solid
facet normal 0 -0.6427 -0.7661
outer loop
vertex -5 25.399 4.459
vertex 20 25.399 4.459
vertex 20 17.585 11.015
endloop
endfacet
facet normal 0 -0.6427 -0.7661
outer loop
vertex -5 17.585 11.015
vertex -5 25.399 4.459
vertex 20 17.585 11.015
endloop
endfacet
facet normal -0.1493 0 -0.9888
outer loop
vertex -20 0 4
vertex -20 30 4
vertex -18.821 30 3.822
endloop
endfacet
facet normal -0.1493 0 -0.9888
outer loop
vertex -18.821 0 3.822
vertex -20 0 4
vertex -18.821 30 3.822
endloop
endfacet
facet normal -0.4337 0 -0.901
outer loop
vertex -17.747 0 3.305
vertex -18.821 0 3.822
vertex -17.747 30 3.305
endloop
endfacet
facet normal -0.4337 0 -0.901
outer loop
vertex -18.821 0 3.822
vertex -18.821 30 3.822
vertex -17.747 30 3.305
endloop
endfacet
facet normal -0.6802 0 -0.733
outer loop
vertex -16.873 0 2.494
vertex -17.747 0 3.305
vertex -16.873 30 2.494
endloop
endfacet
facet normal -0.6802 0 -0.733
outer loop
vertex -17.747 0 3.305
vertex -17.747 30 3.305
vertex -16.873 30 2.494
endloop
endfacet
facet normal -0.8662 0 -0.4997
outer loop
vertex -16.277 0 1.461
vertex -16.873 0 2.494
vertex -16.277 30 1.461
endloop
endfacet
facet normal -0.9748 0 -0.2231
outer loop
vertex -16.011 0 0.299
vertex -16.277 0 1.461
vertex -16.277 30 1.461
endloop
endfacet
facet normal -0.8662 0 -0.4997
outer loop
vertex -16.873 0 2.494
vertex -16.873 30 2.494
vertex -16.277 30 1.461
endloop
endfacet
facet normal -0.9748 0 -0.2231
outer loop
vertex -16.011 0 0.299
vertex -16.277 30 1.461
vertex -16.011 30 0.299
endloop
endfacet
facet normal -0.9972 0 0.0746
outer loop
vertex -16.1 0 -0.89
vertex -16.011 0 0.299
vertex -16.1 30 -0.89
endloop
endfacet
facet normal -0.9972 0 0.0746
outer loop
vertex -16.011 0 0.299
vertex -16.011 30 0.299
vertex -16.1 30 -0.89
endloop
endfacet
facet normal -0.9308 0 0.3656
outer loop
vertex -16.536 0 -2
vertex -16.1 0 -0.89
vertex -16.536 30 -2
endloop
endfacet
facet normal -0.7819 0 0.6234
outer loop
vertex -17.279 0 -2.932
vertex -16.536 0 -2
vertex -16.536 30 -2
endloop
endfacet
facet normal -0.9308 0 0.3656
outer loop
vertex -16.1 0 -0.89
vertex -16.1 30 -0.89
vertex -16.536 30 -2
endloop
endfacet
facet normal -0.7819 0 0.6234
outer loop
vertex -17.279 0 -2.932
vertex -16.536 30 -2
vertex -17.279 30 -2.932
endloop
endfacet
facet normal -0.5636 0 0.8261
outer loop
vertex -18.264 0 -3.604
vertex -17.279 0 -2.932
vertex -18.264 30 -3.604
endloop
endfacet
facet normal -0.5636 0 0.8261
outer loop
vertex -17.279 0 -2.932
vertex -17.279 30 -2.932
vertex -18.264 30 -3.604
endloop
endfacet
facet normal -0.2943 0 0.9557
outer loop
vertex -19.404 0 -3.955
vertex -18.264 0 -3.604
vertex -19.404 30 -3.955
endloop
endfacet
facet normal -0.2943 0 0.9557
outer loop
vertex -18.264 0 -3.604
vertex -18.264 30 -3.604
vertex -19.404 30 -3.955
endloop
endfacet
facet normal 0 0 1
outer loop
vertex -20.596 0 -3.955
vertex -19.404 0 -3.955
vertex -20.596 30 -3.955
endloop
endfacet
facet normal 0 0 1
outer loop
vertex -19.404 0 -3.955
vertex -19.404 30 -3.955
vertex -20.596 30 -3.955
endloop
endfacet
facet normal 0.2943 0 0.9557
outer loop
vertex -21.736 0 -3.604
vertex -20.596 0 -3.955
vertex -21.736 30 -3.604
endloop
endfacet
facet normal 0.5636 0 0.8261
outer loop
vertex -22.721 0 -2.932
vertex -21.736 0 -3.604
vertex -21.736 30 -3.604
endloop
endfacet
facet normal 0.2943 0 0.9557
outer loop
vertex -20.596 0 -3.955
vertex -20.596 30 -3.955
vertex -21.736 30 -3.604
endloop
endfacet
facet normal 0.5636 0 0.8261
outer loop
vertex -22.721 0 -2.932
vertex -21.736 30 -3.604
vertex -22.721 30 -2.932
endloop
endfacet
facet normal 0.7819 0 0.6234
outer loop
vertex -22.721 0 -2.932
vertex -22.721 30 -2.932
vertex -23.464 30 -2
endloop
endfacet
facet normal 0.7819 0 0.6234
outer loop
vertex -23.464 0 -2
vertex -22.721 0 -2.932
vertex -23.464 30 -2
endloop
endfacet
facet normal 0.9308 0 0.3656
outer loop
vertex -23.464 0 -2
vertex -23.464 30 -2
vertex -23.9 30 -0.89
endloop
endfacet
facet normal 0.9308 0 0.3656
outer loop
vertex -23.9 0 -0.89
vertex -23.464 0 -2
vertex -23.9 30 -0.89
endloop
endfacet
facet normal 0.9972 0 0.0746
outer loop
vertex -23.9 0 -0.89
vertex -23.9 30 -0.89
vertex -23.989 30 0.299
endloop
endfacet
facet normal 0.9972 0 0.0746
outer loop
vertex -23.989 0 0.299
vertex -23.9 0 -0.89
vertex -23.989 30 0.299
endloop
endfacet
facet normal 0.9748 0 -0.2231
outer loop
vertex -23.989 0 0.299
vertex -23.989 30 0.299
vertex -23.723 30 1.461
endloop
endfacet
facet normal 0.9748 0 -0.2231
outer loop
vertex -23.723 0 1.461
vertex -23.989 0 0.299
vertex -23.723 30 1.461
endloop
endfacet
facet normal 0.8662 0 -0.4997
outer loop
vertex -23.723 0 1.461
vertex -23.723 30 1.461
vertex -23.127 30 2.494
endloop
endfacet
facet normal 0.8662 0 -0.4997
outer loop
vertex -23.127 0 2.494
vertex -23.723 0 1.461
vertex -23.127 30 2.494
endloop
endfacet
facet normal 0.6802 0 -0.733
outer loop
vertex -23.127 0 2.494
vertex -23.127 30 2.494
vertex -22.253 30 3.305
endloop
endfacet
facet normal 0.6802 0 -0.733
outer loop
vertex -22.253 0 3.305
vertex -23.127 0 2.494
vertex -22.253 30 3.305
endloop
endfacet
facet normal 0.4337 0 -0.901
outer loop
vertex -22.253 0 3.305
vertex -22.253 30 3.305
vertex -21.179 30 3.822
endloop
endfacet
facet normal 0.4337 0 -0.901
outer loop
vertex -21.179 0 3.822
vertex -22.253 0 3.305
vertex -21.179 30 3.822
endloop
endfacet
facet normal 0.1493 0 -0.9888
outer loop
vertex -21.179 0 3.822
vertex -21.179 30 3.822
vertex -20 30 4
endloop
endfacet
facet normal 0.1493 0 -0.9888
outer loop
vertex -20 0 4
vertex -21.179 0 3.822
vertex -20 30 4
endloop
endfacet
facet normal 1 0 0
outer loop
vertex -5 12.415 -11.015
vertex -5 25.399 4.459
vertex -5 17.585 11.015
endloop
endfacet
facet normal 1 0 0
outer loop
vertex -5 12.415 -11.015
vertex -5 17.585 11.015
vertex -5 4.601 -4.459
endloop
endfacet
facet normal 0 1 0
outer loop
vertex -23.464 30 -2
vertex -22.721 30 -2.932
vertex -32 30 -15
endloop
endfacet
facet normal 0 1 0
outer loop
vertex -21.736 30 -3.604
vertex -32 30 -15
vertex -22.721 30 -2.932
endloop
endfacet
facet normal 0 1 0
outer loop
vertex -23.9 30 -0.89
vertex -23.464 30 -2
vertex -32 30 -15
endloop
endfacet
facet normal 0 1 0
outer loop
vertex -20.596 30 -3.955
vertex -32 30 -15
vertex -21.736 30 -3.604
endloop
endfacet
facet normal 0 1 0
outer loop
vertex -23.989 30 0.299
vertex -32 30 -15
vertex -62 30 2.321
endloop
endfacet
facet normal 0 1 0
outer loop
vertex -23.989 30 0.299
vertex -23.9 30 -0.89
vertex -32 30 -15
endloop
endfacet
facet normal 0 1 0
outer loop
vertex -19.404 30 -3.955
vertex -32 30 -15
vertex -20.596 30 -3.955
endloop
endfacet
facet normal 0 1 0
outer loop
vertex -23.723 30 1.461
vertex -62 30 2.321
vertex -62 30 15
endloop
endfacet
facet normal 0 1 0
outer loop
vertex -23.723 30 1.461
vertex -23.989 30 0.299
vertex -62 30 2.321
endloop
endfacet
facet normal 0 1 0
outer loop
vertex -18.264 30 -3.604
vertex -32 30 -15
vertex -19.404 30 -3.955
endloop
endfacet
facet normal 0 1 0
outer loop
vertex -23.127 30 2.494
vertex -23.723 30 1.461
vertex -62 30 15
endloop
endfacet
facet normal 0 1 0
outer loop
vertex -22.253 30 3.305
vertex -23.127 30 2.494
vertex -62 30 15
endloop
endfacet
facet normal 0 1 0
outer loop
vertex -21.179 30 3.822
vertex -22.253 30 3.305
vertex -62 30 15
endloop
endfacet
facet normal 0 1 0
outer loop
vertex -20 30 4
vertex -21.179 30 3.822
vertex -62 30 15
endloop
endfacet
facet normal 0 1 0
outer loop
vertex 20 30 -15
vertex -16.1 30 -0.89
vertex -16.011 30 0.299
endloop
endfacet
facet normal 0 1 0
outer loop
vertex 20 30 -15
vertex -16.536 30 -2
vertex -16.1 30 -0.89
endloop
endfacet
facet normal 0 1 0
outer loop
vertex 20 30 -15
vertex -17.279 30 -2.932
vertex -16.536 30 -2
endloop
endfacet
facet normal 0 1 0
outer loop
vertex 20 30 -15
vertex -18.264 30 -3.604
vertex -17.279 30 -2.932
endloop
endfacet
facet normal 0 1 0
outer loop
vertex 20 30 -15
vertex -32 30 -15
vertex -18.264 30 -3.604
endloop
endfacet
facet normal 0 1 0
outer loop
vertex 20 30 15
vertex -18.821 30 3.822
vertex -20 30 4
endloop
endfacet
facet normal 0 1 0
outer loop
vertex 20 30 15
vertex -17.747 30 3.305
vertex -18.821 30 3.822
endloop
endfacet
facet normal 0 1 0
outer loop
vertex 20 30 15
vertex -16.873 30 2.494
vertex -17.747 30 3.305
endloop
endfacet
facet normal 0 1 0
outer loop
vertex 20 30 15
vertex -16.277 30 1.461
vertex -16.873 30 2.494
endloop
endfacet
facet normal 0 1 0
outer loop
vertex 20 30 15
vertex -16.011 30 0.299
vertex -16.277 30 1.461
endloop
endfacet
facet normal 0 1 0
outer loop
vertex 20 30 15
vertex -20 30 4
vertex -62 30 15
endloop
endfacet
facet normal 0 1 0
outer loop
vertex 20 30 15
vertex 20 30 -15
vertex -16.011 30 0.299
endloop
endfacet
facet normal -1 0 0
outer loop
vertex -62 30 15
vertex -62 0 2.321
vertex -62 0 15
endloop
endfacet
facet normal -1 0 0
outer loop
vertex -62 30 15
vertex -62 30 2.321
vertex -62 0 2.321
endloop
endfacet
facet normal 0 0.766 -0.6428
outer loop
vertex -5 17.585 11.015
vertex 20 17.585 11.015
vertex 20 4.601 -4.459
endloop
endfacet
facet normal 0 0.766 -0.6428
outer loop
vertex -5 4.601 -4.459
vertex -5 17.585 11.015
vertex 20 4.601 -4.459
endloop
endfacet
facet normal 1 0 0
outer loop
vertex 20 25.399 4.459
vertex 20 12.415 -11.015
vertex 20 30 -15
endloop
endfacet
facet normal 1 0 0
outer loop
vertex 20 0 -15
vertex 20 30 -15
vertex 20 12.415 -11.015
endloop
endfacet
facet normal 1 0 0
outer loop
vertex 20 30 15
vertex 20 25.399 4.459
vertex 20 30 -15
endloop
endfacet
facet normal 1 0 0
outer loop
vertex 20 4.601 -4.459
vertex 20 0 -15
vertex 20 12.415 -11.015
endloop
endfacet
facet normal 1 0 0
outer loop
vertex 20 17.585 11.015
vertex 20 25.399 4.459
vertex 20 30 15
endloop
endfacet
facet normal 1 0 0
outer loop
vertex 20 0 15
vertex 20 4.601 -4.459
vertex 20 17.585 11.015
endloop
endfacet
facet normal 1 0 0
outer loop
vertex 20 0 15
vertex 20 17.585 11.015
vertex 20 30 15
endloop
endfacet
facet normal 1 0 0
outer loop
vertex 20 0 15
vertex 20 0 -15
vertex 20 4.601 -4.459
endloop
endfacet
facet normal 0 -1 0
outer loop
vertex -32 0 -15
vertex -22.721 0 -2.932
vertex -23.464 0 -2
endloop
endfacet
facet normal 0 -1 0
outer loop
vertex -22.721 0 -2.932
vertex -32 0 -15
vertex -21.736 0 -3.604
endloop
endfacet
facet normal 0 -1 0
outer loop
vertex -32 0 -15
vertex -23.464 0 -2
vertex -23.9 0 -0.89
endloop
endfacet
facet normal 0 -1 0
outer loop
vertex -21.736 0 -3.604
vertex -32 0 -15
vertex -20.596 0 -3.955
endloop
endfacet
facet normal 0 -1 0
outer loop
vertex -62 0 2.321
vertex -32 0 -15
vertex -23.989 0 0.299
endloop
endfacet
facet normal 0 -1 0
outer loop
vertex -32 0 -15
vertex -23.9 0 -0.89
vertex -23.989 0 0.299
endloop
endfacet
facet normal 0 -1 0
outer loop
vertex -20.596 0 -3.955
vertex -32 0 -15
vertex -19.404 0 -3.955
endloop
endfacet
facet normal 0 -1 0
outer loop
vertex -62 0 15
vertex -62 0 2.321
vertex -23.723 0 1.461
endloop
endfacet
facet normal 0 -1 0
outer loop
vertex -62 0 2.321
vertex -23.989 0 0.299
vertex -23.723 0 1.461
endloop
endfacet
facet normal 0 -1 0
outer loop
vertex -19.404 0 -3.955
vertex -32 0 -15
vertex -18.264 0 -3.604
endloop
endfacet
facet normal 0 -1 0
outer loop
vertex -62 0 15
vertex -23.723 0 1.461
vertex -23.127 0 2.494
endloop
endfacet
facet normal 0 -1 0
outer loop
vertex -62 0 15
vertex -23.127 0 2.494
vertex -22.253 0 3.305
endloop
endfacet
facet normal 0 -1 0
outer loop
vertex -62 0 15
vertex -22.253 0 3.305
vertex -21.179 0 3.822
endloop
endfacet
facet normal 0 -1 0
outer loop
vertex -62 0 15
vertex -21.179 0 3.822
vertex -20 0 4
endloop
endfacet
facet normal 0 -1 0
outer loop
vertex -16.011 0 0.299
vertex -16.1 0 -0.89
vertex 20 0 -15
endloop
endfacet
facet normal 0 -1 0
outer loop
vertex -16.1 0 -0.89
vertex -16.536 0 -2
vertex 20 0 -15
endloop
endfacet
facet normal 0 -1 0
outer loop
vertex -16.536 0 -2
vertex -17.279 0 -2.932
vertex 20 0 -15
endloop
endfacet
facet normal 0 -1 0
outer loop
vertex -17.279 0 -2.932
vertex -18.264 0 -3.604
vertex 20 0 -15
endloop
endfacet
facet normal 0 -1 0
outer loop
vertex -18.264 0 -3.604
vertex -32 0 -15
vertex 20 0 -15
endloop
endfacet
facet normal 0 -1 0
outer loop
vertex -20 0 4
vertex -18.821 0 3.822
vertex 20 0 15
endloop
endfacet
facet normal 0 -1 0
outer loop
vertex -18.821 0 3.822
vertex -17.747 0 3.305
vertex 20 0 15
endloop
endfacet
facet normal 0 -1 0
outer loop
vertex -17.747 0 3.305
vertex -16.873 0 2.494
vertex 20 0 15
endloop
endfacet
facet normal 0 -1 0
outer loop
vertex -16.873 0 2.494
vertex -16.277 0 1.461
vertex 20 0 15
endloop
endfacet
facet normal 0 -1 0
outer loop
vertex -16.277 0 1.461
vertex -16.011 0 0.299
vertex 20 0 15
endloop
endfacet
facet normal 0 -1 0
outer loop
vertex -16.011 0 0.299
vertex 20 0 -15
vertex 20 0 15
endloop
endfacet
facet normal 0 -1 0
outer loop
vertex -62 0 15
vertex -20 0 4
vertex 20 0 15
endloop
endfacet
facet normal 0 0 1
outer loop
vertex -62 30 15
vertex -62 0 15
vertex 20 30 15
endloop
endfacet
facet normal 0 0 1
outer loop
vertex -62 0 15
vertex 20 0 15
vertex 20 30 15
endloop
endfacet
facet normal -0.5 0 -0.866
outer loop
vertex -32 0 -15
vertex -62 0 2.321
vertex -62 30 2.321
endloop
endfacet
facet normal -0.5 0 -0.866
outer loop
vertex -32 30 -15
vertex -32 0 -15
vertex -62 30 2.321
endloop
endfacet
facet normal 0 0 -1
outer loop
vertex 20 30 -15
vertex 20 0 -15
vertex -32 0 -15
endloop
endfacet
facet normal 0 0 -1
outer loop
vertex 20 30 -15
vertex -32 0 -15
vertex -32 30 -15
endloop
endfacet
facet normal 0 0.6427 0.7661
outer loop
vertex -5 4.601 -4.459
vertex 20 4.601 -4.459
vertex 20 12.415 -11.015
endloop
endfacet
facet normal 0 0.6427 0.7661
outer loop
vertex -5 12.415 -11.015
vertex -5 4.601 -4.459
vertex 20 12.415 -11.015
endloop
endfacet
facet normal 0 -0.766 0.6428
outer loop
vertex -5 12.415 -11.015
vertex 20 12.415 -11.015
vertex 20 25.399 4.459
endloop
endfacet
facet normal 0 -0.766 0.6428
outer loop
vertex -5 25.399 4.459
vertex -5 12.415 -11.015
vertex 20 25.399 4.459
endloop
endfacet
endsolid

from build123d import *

# Parameters (mm, degrees)
EXTRUDE_1_DEPTH     = 30
SKETCH_2_R          = 4
CUT_EXTRUDE_1_DEPTH = 49.476798574
CUT_EXTRUDE_4_DEPTH = 25
SKETCH1_W           = 30
SKETCH1_H           = 30
BOSS_EXTRUDE1_DEPTH = 27
CHAMFER1_SIZE       = 30
CHAMFER1_SIZE2      = 17.320508076


with BuildPart() as part:
    # Эскиз1 → Бобышка-Вытянуть1 (new body)
    with BuildSketch(Plane(origin=(0, 0, 0), x_dir=(1, 0, 0), z_dir=(0, 1, 0))):
        Polygon((-20, -15), (-35, -15), (-35, 15), (-20, 15), (20, 15), (20, -15), align=None)
    extrude(amount=EXTRUDE_1_DEPTH)

    # Эскиз2 → Вырез-Вытянуть1 (cut, through all)
    with BuildSketch(Plane(origin=(0, 30, 0), x_dir=(1, 0, 0), z_dir=(0, 1, 0))):
        with Locations(Location((-20, 0, 0), (0, 0, 270))):
            Circle(SKETCH_2_R)
    extrude(amount=-CUT_EXTRUDE_1_DEPTH, mode=Mode.SUBTRACT)

    # Эскиз5 → Вырез-Вытянуть4 (cut)
    with BuildSketch(Plane(origin=(20, 0, 0), x_dir=(0, 0, -1), z_dir=(1, 0, 0))):
        Polygon((4.458832066, 4.601018482), (11.015265685, 12.414671802), (-4.458832066, 25.398981518), (-11.015265685, 17.585328198), align=None)
    extrude(amount=-CUT_EXTRUDE_4_DEPTH, mode=Mode.SUBTRACT)

    # Sketch1 → Boss-Extrude1 (add)
    with BuildSketch(Plane.ZY.offset(35)):
        with Locations((0, 15)):
            Rectangle(SKETCH1_W, SKETCH1_H)
    extrude(amount=BOSS_EXTRUDE1_DEPTH)

    # Chamfer1
    chamfer1_edges = [part.edges().sort_by_distance(p)[0] for p in [
        (-62, 15, -15),
    ]]
    chamfer1_side = [part.faces().sort_by_distance(p)[0] for p in [
        (-21, 15, -15),
    ]]
    chamfer(chamfer1_edges, length=CHAMFER1_SIZE, length2=CHAMFER1_SIZE2, reference=chamfer1_side[0])


solid = part.part
